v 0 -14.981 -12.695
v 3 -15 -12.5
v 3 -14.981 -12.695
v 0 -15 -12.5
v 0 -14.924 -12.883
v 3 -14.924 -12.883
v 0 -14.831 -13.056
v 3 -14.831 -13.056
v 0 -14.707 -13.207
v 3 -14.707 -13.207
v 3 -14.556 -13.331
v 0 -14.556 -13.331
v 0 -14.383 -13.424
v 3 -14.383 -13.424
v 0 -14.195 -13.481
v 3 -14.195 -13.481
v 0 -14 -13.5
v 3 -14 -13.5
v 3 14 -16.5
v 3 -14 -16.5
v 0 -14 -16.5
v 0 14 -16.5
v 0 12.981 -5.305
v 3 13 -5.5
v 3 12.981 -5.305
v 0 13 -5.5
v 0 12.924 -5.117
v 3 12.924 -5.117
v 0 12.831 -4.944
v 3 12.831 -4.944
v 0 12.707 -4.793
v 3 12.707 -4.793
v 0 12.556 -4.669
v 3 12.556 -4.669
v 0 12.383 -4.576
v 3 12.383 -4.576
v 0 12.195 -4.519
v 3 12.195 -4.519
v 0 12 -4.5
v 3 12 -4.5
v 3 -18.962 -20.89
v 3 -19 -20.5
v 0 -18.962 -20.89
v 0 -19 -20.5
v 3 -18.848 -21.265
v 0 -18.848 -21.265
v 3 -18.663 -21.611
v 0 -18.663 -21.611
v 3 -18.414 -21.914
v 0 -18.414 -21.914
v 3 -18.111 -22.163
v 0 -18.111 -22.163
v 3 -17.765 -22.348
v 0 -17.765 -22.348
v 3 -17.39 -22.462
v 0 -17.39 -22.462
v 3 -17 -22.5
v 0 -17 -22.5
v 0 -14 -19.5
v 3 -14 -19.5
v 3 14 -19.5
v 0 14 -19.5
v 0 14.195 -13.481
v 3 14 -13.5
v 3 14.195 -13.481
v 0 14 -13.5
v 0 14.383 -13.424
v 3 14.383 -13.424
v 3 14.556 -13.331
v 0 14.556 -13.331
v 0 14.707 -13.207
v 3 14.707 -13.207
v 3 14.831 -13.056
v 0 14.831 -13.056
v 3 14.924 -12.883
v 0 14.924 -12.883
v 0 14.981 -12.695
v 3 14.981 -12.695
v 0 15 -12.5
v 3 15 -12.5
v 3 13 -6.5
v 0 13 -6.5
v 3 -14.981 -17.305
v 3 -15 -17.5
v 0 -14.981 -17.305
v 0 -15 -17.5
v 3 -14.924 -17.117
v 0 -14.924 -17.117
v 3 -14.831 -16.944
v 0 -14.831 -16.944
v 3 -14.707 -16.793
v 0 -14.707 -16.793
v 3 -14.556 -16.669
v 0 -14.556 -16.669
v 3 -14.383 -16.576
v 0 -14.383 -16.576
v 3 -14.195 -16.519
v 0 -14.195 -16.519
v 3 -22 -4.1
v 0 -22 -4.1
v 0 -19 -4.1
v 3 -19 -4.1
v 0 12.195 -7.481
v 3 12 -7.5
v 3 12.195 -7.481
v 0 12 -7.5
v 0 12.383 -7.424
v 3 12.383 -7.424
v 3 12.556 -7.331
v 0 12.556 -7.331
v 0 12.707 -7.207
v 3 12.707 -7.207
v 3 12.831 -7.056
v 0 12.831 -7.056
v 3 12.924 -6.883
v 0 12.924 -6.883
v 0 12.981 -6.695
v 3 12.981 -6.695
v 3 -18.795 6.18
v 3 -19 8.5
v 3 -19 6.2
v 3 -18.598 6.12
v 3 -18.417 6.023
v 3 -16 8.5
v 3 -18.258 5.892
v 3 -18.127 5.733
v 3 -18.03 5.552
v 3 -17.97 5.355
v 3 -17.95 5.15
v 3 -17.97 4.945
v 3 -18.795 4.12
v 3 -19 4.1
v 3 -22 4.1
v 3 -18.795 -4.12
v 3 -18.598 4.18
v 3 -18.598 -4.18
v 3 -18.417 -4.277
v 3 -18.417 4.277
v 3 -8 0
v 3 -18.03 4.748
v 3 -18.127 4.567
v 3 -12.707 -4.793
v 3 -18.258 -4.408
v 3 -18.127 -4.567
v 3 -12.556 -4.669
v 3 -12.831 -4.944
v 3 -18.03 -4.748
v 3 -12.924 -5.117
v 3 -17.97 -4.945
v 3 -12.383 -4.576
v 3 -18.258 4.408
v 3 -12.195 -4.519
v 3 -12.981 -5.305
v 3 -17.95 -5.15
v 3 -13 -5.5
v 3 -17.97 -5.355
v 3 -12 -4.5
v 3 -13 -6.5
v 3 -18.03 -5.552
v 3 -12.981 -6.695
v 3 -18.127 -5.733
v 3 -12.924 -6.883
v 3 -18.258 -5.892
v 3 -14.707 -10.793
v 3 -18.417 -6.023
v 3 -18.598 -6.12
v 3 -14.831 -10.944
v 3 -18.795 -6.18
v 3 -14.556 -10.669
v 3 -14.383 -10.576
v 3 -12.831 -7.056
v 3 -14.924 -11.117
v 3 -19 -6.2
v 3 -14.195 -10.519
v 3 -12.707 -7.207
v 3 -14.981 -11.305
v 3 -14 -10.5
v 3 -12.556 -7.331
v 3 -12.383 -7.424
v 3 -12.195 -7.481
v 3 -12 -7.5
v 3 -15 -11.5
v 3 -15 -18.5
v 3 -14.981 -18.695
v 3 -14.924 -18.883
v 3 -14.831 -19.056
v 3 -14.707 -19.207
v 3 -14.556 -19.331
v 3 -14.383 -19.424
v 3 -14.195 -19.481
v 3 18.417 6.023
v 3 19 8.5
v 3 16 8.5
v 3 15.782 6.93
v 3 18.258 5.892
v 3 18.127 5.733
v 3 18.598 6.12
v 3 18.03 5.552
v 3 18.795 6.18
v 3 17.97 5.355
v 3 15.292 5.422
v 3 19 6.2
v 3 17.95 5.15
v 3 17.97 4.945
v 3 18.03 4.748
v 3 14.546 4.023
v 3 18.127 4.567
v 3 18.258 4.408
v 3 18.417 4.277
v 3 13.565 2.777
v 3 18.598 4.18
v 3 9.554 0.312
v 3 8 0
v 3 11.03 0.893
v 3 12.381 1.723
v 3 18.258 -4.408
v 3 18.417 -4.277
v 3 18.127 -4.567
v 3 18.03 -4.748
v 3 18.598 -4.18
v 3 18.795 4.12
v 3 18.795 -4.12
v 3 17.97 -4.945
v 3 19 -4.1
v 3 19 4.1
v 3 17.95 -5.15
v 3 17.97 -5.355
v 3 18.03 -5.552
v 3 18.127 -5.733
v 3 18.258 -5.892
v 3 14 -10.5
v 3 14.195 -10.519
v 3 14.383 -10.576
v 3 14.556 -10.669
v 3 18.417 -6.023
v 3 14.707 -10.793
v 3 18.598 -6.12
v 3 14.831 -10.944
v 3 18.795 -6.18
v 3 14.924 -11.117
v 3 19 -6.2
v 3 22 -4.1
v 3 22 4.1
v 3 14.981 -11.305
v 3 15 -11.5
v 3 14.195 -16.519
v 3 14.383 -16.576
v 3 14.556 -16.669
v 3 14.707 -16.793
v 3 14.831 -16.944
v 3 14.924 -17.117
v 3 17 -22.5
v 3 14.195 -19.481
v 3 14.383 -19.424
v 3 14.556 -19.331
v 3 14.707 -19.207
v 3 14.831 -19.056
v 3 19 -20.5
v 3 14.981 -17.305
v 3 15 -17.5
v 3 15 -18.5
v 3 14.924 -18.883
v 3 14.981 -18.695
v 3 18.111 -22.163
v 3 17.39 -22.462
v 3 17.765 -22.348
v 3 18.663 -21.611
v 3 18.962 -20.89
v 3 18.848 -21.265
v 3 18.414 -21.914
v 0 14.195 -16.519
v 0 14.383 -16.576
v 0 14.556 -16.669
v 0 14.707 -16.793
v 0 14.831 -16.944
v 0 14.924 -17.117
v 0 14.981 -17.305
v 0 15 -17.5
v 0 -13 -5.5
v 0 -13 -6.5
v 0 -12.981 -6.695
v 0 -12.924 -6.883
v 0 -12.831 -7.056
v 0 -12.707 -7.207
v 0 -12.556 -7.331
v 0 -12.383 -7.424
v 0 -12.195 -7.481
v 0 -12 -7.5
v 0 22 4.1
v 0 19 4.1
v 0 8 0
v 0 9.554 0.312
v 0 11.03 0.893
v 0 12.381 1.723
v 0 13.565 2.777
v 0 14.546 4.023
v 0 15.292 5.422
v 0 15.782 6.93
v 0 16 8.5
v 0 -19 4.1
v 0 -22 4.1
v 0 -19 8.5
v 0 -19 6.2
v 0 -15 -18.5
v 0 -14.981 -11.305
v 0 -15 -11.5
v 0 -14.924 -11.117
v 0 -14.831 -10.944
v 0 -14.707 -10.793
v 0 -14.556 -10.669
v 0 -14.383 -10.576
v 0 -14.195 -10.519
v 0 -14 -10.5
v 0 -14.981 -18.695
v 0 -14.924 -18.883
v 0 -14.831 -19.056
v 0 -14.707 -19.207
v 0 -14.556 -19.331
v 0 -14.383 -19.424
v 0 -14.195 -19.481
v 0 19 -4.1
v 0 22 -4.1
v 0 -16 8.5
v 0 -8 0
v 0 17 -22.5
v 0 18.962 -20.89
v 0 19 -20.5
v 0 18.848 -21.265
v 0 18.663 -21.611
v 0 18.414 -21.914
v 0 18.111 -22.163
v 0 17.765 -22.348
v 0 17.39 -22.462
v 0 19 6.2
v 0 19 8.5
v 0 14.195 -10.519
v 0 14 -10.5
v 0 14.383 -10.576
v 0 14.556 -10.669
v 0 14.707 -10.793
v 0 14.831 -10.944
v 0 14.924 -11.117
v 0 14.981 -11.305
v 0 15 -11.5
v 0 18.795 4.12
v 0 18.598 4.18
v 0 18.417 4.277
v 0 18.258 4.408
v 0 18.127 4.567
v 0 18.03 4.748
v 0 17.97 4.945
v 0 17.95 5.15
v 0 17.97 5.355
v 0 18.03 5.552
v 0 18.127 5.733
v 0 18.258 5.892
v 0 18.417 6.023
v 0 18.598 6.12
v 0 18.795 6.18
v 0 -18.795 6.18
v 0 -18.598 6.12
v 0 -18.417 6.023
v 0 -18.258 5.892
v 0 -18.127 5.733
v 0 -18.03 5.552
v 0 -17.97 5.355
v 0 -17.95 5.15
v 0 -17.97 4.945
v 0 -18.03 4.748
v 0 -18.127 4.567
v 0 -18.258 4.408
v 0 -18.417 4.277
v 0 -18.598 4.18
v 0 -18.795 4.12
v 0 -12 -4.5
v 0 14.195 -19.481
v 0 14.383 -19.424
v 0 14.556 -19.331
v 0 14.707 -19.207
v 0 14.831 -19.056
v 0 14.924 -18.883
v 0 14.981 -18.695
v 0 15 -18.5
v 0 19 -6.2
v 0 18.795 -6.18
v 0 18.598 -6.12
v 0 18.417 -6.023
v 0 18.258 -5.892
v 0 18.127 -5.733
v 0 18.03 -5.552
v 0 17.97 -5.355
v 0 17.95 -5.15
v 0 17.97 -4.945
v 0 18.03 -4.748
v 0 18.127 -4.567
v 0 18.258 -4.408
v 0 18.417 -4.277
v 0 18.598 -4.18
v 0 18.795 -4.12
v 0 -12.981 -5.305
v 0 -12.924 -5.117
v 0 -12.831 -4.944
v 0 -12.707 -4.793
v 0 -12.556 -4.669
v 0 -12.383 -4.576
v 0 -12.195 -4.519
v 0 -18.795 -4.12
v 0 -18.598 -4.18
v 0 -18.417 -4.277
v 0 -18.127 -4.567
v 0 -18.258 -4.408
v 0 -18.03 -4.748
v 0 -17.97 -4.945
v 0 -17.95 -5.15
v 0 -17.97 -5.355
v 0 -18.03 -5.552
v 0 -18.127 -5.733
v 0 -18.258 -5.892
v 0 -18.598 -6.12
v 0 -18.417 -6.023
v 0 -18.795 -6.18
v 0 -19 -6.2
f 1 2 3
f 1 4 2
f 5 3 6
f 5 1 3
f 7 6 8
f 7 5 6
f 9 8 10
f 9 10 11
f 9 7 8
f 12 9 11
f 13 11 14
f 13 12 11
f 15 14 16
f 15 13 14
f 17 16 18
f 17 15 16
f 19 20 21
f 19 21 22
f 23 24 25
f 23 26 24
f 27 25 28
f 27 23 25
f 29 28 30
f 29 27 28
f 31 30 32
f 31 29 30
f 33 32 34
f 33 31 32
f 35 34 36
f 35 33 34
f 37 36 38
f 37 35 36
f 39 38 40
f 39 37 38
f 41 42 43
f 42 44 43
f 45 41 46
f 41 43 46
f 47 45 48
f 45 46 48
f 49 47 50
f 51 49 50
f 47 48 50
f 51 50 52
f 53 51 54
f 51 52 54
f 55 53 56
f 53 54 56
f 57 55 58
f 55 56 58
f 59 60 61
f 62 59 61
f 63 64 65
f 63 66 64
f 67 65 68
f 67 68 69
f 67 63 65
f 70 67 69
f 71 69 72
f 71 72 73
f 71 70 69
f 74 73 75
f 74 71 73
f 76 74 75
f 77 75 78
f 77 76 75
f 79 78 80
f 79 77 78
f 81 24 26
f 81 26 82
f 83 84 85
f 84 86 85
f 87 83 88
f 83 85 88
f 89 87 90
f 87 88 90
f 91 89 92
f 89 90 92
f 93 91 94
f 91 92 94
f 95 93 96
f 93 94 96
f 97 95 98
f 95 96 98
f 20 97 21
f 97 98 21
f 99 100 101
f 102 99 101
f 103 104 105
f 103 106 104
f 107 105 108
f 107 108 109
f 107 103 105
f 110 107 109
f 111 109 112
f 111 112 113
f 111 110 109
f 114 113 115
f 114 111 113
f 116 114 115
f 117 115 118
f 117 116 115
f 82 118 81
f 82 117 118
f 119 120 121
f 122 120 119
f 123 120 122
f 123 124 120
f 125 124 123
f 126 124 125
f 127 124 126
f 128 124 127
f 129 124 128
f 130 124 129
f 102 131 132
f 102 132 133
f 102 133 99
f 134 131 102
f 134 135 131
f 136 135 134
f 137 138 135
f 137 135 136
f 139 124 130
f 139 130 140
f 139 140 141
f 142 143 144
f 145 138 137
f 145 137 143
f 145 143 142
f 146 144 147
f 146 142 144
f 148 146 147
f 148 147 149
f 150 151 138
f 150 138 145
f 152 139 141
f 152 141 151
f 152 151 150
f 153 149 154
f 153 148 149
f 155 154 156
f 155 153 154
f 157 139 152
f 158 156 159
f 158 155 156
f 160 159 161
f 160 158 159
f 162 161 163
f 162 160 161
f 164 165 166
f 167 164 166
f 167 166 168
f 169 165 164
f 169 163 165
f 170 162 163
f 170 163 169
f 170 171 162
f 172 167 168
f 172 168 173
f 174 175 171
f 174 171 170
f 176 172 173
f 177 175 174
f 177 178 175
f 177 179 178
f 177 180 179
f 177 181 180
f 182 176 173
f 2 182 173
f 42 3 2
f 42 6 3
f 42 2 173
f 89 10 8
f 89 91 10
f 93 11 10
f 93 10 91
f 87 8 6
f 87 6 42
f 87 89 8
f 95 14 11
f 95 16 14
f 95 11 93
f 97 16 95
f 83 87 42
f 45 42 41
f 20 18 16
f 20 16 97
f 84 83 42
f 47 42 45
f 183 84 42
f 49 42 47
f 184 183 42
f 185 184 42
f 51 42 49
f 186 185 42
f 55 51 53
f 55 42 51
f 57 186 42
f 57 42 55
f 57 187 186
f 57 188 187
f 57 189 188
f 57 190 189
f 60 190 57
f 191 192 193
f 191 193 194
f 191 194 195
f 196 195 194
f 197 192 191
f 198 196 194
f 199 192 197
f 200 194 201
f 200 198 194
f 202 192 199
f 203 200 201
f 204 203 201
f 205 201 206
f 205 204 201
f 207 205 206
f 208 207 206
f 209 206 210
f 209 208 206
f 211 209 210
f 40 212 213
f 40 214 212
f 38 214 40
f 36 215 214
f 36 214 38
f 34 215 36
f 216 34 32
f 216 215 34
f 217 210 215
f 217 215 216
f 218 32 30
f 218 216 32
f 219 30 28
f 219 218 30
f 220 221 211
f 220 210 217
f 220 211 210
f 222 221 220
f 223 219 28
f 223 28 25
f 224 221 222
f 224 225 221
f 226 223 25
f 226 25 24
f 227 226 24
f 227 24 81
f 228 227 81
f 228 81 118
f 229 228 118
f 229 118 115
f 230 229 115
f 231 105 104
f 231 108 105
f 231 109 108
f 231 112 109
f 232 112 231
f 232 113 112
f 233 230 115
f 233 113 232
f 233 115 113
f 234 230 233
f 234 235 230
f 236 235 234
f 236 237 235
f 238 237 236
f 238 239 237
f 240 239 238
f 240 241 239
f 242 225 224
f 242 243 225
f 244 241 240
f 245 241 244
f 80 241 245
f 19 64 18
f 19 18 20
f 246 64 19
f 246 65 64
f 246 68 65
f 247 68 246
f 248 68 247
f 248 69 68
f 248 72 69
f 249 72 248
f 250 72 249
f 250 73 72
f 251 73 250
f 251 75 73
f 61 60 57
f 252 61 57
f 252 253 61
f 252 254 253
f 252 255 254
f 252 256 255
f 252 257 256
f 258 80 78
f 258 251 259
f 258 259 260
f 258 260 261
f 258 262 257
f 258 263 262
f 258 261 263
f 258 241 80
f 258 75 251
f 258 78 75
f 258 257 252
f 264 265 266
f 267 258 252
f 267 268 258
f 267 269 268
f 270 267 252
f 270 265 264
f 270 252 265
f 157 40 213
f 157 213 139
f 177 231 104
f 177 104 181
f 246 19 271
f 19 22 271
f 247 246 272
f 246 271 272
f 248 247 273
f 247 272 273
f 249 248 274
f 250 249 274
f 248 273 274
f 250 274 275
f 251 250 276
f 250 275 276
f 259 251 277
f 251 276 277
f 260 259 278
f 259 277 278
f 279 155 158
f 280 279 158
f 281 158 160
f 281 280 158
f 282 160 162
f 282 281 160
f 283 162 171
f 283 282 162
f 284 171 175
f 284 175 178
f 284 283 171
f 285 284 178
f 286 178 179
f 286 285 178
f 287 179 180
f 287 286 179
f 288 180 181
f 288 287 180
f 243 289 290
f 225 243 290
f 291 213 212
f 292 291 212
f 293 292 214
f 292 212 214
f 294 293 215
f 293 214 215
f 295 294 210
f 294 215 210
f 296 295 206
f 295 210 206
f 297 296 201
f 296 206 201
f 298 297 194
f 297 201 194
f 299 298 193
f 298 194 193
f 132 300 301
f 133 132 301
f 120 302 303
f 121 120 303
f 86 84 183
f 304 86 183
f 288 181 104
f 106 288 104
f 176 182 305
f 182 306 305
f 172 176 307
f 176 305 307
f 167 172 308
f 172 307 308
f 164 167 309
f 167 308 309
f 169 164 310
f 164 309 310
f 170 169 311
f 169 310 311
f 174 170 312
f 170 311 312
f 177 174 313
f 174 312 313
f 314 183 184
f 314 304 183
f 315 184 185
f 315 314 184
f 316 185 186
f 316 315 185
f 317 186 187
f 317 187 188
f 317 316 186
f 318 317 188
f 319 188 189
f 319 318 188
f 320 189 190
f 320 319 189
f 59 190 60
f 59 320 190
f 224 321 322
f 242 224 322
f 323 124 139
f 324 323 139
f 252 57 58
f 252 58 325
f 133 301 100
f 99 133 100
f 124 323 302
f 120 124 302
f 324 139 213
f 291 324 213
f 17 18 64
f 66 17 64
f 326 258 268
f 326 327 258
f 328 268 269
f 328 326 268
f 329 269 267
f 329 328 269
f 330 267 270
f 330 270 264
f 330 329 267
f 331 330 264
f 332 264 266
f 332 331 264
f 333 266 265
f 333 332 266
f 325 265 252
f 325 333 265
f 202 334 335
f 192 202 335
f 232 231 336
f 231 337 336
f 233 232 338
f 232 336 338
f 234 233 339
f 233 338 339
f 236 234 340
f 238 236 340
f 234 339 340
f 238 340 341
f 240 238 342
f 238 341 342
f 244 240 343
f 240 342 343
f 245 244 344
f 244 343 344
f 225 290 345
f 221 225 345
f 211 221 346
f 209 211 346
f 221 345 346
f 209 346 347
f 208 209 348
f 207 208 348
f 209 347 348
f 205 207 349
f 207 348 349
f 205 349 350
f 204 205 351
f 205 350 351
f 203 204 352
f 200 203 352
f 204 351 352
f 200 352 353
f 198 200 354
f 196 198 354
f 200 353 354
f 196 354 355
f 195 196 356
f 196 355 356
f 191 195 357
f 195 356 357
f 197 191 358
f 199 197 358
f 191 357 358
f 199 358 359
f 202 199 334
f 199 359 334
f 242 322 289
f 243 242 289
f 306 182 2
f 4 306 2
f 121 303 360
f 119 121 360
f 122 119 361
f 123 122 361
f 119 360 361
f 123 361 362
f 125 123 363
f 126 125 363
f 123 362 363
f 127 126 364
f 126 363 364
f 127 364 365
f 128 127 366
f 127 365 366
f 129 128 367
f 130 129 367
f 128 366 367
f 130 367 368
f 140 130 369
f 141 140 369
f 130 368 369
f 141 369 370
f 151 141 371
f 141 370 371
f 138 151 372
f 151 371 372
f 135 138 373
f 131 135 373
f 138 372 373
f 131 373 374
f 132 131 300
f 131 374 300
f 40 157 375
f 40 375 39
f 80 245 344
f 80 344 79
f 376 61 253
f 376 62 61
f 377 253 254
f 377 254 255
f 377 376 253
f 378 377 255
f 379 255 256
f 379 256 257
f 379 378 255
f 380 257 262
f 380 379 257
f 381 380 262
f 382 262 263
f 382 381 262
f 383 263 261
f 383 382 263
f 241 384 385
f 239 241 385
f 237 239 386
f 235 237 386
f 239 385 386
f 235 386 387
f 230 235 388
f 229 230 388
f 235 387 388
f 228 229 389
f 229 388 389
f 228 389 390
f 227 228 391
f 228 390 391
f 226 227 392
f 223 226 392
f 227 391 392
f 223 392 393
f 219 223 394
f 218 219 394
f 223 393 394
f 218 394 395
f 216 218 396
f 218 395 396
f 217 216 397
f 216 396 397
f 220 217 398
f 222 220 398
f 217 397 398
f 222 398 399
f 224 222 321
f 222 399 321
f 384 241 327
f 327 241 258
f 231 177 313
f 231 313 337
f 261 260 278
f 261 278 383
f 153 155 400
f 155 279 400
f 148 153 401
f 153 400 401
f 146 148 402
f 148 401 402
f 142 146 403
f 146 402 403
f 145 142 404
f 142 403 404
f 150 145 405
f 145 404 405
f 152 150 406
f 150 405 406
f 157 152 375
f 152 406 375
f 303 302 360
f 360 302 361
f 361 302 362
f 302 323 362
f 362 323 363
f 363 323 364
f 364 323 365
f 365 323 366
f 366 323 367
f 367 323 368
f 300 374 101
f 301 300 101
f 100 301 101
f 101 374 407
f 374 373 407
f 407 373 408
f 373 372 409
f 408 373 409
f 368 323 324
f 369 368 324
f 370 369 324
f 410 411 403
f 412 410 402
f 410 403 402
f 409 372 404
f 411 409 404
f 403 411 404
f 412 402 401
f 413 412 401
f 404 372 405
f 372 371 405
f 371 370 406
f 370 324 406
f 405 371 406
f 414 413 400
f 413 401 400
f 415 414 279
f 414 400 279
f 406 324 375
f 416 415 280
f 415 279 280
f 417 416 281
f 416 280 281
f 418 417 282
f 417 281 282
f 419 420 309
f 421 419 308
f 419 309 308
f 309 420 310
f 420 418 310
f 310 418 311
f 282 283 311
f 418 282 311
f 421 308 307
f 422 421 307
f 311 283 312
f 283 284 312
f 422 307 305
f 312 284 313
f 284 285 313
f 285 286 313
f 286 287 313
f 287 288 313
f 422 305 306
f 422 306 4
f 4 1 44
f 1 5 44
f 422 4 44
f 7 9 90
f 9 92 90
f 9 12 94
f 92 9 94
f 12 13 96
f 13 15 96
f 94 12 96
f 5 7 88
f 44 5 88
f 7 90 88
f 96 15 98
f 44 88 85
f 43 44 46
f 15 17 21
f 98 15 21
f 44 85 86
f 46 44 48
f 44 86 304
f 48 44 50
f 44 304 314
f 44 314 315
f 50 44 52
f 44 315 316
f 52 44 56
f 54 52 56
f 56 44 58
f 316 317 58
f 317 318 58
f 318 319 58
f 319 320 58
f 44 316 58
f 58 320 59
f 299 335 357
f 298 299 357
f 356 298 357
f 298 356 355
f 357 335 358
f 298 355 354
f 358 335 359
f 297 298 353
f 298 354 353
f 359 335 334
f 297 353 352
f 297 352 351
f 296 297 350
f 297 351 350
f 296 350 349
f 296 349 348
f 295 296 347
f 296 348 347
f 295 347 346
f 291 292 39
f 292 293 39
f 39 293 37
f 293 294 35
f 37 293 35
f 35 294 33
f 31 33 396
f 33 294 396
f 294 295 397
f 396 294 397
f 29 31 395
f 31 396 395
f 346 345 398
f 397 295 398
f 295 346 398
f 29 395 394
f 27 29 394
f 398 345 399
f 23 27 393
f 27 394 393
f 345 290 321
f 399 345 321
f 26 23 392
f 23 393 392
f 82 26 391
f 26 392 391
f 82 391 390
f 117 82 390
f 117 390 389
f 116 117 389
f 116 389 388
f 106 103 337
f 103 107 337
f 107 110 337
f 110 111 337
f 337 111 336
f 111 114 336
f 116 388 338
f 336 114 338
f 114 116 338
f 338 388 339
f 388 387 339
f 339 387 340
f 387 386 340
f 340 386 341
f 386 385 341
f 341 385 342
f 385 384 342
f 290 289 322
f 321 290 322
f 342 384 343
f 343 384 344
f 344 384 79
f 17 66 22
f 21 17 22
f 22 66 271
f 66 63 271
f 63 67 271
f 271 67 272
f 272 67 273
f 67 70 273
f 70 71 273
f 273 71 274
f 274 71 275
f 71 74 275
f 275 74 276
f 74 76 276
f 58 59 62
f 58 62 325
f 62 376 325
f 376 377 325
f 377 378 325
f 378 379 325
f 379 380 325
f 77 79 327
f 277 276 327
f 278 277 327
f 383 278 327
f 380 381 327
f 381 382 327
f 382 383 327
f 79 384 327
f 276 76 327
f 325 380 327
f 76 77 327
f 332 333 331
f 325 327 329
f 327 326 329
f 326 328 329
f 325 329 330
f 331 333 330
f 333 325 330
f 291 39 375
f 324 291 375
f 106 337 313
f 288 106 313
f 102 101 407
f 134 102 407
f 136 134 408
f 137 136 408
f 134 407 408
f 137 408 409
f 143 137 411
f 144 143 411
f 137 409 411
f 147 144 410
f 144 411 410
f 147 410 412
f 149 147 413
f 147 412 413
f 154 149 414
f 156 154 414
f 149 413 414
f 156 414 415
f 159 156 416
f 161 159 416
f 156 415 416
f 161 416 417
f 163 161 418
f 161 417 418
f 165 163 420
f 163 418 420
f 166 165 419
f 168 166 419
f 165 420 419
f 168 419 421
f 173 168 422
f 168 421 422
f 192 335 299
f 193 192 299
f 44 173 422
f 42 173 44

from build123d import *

# Parameters (mm, degrees)
EXTRUDE_1_DEPTH     = 3
SKETCH_4_W          = 14
SKETCH_4_H          = 38
SKETCH_4_W_2        = 3
SKETCH_4_H_2        = 30
EXTRUDE_2_DEPTH     = 3
FILLET_1_R          = 2
SKETCH_5_W          = 3
SKETCH_5_H          = 26
CUT_EXTRUDE_1_DEPTH = 10
FILLET_2_R          = 1


with BuildPart() as part:
    # 草图1 → 凸台-拉伸1 (new body)
    with BuildSketch(Plane(origin=(0, 0, 0), x_dir=(0, 0, -1), z_dir=(1, 0, 0))):
        with BuildLine():
            Line((-4.1, 22), (-4.1, 19))
            ThreePointArc((-4.1, 19), (-5.15, 17.95), (-6.2, 19))
            Line((-6.2, 19), (-8.5, 19))
            Line((-8.5, 19), (-8.5, -19))
            Line((-8.5, -19), (-6.2, -19))
            ThreePointArc((-6.2, -19), (-5.15, -17.95), (-4.1, -19))
            Line((-4.1, -19), (-4.1, -22))
            Line((-4.1, -22), (4.1, -22))
            Line((4.1, -22), (4.1, -19))
            ThreePointArc((4.1, -19), (5.15, -17.95), (6.2, -19))
            Line((6.2, -19), (8.5, -19))
            Line((8.5, -19), (8.5, 19))
            Line((8.5, 19), (6.2, 19))
            ThreePointArc((6.2, 19), (5.15, 17.95), (4.1, 19))
            Line((4.1, 19), (4.1, 22))
            Line((4.1, 22), (-4.1, 22))
        make_face()
    extrude(amount=EXTRUDE_1_DEPTH)

    # 草图4 → 凸台-拉伸2 (add)
    with BuildSketch(Plane(origin=(3, 0, 0), x_dir=(0, 0, -1), z_dir=(1, 0, 0))):
        with Locations((15.5, 0)):
            Rectangle(SKETCH_4_W, SKETCH_4_H)
        with Locations((12, 0)):
            Rectangle(SKETCH_4_W_2, SKETCH_4_H_2, mode=Mode.SUBTRACT)
        with Locations((18, 0)):
            Rectangle(SKETCH_4_W_2, SKETCH_4_H_2, mode=Mode.SUBTRACT)
    extrude(amount=-EXTRUDE_2_DEPTH)

    # 圆角1
    fillet_1_edges = [part.edges().sort_by_distance(p)[0] for p in [
        (1.5, -19, -22.5),
        (1.5, 19, -22.5),
    ]]
    fillet(fillet_1_edges, radius=FILLET_1_R)

    # 草图5 → 切除-拉伸1 (cut)
    with BuildSketch(Plane(origin=(3, 0, 0), x_dir=(0, 0, -1), z_dir=(1, 0, 0))):
        with BuildLine():
            Line((-8.5, -16), (0, -8))
            Line((0, -8), (0, 8))
            ThreePointArc((0, 8), (-2.777216236, 13.564832749), (-8.5, 16))
            Line((-8.5, 16), (-8.5, -16))
        make_face()
        with Locations((6, 0)):
            Rectangle(SKETCH_5_W, SKETCH_5_H)
    extrude(amount=-CUT_EXTRUDE_1_DEPTH, mode=Mode.SUBTRACT)

    # 圆角2
    fillet_2_edges = [part.edges().sort_by_distance(p)[0] for p in [
        (1.5, 13, -4.5),
        (1.5, 13, -7.5),
        (1.5, -13, -7.5),
        (1.5, -13, -4.5),
        (1.5, -15, -16.5),
        (1.5, -15, -19.5),
        (1.5, 15, -19.5),
        (1.5, 15, -16.5),
        (1.5, -15, -10.5),
        (1.5, -15, -13.5),
        (1.5, 15, -13.5),
        (1.5, 15, -10.5),
    ]]
    fillet(fillet_2_edges, radius=FILLET_2_R)


solid = part.part
